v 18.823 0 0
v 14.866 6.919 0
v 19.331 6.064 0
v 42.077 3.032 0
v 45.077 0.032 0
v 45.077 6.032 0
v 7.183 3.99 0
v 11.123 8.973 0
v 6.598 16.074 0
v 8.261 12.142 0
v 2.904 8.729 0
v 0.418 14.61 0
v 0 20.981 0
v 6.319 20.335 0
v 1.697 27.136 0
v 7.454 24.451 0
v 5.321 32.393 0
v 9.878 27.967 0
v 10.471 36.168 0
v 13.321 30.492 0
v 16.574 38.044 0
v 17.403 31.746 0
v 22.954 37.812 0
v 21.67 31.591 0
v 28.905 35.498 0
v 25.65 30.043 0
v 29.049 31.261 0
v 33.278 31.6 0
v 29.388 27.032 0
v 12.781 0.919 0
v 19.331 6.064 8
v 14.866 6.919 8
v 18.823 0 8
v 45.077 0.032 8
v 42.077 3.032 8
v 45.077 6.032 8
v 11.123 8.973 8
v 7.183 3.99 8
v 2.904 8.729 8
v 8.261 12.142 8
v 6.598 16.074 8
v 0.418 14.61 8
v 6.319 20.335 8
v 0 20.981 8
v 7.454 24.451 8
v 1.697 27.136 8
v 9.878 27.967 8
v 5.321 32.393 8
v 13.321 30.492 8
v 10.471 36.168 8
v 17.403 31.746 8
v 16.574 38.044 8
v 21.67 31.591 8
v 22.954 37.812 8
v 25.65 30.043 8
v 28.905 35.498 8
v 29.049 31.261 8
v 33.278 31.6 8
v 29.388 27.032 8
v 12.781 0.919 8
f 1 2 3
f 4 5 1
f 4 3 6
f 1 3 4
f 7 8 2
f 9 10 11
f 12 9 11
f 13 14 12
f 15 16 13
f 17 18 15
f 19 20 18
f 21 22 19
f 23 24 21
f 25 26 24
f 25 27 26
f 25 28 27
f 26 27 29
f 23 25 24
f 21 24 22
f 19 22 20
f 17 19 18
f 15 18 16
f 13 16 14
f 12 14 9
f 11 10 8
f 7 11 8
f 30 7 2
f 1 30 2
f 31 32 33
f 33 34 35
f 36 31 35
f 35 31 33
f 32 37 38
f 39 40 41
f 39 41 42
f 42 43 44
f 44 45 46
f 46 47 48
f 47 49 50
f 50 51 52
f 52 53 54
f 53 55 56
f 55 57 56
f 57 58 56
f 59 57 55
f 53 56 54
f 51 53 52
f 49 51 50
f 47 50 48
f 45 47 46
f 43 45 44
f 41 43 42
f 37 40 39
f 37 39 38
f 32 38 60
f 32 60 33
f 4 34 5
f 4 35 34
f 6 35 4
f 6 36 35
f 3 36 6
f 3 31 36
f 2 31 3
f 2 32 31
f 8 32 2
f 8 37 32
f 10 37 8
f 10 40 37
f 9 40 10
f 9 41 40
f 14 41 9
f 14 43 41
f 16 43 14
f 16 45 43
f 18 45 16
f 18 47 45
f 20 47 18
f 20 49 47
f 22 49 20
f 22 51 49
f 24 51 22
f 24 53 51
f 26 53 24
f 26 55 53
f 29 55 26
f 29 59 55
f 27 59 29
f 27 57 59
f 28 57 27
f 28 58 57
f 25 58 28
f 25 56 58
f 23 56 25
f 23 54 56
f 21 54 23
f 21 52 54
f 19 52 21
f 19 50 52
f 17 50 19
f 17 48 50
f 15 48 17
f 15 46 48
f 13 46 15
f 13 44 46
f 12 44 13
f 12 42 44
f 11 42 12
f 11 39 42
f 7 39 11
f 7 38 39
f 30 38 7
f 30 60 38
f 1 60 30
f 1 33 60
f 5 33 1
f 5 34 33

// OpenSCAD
$fn = 32;

// ----------------------------------------------------------------------
// Eye lug: ring_tail, 8 mm thick
// ----------------------------------------------------------------------

// --- parameters (mm) ---
profile_height = 8;       // extrusion height
profile_points = 30;      // points of the closed outline

profile = [[29.049, 31.261], [33.278, 31.6], [28.905, 35.498], [22.954, 37.812], [16.574, 38.044], [10.471, 36.168], [5.321, 32.393], [1.697, 27.136], [0, 20.981], [0.418, 14.61], [2.904, 8.729], [7.183, 3.99], [12.781, 0.919], [18.823, 0], [45.077, 0.032], [42.077, 3.032], [45.077, 6.032], [19.331, 6.064], [14.866, 6.919], [11.123, 8.973], [8.261, 12.142], [6.598, 16.074], [6.319, 20.335], [7.454, 24.451], [9.878, 27.967], [13.321, 30.492], [17.403, 31.746], [21.67, 31.591], [25.65, 30.043], [29.388, 27.032]];  // single closed polygon, 30 points, counter clockwise

// --- the one profile operation ---
linear_extrude(height = profile_height) polygon(points = profile);
